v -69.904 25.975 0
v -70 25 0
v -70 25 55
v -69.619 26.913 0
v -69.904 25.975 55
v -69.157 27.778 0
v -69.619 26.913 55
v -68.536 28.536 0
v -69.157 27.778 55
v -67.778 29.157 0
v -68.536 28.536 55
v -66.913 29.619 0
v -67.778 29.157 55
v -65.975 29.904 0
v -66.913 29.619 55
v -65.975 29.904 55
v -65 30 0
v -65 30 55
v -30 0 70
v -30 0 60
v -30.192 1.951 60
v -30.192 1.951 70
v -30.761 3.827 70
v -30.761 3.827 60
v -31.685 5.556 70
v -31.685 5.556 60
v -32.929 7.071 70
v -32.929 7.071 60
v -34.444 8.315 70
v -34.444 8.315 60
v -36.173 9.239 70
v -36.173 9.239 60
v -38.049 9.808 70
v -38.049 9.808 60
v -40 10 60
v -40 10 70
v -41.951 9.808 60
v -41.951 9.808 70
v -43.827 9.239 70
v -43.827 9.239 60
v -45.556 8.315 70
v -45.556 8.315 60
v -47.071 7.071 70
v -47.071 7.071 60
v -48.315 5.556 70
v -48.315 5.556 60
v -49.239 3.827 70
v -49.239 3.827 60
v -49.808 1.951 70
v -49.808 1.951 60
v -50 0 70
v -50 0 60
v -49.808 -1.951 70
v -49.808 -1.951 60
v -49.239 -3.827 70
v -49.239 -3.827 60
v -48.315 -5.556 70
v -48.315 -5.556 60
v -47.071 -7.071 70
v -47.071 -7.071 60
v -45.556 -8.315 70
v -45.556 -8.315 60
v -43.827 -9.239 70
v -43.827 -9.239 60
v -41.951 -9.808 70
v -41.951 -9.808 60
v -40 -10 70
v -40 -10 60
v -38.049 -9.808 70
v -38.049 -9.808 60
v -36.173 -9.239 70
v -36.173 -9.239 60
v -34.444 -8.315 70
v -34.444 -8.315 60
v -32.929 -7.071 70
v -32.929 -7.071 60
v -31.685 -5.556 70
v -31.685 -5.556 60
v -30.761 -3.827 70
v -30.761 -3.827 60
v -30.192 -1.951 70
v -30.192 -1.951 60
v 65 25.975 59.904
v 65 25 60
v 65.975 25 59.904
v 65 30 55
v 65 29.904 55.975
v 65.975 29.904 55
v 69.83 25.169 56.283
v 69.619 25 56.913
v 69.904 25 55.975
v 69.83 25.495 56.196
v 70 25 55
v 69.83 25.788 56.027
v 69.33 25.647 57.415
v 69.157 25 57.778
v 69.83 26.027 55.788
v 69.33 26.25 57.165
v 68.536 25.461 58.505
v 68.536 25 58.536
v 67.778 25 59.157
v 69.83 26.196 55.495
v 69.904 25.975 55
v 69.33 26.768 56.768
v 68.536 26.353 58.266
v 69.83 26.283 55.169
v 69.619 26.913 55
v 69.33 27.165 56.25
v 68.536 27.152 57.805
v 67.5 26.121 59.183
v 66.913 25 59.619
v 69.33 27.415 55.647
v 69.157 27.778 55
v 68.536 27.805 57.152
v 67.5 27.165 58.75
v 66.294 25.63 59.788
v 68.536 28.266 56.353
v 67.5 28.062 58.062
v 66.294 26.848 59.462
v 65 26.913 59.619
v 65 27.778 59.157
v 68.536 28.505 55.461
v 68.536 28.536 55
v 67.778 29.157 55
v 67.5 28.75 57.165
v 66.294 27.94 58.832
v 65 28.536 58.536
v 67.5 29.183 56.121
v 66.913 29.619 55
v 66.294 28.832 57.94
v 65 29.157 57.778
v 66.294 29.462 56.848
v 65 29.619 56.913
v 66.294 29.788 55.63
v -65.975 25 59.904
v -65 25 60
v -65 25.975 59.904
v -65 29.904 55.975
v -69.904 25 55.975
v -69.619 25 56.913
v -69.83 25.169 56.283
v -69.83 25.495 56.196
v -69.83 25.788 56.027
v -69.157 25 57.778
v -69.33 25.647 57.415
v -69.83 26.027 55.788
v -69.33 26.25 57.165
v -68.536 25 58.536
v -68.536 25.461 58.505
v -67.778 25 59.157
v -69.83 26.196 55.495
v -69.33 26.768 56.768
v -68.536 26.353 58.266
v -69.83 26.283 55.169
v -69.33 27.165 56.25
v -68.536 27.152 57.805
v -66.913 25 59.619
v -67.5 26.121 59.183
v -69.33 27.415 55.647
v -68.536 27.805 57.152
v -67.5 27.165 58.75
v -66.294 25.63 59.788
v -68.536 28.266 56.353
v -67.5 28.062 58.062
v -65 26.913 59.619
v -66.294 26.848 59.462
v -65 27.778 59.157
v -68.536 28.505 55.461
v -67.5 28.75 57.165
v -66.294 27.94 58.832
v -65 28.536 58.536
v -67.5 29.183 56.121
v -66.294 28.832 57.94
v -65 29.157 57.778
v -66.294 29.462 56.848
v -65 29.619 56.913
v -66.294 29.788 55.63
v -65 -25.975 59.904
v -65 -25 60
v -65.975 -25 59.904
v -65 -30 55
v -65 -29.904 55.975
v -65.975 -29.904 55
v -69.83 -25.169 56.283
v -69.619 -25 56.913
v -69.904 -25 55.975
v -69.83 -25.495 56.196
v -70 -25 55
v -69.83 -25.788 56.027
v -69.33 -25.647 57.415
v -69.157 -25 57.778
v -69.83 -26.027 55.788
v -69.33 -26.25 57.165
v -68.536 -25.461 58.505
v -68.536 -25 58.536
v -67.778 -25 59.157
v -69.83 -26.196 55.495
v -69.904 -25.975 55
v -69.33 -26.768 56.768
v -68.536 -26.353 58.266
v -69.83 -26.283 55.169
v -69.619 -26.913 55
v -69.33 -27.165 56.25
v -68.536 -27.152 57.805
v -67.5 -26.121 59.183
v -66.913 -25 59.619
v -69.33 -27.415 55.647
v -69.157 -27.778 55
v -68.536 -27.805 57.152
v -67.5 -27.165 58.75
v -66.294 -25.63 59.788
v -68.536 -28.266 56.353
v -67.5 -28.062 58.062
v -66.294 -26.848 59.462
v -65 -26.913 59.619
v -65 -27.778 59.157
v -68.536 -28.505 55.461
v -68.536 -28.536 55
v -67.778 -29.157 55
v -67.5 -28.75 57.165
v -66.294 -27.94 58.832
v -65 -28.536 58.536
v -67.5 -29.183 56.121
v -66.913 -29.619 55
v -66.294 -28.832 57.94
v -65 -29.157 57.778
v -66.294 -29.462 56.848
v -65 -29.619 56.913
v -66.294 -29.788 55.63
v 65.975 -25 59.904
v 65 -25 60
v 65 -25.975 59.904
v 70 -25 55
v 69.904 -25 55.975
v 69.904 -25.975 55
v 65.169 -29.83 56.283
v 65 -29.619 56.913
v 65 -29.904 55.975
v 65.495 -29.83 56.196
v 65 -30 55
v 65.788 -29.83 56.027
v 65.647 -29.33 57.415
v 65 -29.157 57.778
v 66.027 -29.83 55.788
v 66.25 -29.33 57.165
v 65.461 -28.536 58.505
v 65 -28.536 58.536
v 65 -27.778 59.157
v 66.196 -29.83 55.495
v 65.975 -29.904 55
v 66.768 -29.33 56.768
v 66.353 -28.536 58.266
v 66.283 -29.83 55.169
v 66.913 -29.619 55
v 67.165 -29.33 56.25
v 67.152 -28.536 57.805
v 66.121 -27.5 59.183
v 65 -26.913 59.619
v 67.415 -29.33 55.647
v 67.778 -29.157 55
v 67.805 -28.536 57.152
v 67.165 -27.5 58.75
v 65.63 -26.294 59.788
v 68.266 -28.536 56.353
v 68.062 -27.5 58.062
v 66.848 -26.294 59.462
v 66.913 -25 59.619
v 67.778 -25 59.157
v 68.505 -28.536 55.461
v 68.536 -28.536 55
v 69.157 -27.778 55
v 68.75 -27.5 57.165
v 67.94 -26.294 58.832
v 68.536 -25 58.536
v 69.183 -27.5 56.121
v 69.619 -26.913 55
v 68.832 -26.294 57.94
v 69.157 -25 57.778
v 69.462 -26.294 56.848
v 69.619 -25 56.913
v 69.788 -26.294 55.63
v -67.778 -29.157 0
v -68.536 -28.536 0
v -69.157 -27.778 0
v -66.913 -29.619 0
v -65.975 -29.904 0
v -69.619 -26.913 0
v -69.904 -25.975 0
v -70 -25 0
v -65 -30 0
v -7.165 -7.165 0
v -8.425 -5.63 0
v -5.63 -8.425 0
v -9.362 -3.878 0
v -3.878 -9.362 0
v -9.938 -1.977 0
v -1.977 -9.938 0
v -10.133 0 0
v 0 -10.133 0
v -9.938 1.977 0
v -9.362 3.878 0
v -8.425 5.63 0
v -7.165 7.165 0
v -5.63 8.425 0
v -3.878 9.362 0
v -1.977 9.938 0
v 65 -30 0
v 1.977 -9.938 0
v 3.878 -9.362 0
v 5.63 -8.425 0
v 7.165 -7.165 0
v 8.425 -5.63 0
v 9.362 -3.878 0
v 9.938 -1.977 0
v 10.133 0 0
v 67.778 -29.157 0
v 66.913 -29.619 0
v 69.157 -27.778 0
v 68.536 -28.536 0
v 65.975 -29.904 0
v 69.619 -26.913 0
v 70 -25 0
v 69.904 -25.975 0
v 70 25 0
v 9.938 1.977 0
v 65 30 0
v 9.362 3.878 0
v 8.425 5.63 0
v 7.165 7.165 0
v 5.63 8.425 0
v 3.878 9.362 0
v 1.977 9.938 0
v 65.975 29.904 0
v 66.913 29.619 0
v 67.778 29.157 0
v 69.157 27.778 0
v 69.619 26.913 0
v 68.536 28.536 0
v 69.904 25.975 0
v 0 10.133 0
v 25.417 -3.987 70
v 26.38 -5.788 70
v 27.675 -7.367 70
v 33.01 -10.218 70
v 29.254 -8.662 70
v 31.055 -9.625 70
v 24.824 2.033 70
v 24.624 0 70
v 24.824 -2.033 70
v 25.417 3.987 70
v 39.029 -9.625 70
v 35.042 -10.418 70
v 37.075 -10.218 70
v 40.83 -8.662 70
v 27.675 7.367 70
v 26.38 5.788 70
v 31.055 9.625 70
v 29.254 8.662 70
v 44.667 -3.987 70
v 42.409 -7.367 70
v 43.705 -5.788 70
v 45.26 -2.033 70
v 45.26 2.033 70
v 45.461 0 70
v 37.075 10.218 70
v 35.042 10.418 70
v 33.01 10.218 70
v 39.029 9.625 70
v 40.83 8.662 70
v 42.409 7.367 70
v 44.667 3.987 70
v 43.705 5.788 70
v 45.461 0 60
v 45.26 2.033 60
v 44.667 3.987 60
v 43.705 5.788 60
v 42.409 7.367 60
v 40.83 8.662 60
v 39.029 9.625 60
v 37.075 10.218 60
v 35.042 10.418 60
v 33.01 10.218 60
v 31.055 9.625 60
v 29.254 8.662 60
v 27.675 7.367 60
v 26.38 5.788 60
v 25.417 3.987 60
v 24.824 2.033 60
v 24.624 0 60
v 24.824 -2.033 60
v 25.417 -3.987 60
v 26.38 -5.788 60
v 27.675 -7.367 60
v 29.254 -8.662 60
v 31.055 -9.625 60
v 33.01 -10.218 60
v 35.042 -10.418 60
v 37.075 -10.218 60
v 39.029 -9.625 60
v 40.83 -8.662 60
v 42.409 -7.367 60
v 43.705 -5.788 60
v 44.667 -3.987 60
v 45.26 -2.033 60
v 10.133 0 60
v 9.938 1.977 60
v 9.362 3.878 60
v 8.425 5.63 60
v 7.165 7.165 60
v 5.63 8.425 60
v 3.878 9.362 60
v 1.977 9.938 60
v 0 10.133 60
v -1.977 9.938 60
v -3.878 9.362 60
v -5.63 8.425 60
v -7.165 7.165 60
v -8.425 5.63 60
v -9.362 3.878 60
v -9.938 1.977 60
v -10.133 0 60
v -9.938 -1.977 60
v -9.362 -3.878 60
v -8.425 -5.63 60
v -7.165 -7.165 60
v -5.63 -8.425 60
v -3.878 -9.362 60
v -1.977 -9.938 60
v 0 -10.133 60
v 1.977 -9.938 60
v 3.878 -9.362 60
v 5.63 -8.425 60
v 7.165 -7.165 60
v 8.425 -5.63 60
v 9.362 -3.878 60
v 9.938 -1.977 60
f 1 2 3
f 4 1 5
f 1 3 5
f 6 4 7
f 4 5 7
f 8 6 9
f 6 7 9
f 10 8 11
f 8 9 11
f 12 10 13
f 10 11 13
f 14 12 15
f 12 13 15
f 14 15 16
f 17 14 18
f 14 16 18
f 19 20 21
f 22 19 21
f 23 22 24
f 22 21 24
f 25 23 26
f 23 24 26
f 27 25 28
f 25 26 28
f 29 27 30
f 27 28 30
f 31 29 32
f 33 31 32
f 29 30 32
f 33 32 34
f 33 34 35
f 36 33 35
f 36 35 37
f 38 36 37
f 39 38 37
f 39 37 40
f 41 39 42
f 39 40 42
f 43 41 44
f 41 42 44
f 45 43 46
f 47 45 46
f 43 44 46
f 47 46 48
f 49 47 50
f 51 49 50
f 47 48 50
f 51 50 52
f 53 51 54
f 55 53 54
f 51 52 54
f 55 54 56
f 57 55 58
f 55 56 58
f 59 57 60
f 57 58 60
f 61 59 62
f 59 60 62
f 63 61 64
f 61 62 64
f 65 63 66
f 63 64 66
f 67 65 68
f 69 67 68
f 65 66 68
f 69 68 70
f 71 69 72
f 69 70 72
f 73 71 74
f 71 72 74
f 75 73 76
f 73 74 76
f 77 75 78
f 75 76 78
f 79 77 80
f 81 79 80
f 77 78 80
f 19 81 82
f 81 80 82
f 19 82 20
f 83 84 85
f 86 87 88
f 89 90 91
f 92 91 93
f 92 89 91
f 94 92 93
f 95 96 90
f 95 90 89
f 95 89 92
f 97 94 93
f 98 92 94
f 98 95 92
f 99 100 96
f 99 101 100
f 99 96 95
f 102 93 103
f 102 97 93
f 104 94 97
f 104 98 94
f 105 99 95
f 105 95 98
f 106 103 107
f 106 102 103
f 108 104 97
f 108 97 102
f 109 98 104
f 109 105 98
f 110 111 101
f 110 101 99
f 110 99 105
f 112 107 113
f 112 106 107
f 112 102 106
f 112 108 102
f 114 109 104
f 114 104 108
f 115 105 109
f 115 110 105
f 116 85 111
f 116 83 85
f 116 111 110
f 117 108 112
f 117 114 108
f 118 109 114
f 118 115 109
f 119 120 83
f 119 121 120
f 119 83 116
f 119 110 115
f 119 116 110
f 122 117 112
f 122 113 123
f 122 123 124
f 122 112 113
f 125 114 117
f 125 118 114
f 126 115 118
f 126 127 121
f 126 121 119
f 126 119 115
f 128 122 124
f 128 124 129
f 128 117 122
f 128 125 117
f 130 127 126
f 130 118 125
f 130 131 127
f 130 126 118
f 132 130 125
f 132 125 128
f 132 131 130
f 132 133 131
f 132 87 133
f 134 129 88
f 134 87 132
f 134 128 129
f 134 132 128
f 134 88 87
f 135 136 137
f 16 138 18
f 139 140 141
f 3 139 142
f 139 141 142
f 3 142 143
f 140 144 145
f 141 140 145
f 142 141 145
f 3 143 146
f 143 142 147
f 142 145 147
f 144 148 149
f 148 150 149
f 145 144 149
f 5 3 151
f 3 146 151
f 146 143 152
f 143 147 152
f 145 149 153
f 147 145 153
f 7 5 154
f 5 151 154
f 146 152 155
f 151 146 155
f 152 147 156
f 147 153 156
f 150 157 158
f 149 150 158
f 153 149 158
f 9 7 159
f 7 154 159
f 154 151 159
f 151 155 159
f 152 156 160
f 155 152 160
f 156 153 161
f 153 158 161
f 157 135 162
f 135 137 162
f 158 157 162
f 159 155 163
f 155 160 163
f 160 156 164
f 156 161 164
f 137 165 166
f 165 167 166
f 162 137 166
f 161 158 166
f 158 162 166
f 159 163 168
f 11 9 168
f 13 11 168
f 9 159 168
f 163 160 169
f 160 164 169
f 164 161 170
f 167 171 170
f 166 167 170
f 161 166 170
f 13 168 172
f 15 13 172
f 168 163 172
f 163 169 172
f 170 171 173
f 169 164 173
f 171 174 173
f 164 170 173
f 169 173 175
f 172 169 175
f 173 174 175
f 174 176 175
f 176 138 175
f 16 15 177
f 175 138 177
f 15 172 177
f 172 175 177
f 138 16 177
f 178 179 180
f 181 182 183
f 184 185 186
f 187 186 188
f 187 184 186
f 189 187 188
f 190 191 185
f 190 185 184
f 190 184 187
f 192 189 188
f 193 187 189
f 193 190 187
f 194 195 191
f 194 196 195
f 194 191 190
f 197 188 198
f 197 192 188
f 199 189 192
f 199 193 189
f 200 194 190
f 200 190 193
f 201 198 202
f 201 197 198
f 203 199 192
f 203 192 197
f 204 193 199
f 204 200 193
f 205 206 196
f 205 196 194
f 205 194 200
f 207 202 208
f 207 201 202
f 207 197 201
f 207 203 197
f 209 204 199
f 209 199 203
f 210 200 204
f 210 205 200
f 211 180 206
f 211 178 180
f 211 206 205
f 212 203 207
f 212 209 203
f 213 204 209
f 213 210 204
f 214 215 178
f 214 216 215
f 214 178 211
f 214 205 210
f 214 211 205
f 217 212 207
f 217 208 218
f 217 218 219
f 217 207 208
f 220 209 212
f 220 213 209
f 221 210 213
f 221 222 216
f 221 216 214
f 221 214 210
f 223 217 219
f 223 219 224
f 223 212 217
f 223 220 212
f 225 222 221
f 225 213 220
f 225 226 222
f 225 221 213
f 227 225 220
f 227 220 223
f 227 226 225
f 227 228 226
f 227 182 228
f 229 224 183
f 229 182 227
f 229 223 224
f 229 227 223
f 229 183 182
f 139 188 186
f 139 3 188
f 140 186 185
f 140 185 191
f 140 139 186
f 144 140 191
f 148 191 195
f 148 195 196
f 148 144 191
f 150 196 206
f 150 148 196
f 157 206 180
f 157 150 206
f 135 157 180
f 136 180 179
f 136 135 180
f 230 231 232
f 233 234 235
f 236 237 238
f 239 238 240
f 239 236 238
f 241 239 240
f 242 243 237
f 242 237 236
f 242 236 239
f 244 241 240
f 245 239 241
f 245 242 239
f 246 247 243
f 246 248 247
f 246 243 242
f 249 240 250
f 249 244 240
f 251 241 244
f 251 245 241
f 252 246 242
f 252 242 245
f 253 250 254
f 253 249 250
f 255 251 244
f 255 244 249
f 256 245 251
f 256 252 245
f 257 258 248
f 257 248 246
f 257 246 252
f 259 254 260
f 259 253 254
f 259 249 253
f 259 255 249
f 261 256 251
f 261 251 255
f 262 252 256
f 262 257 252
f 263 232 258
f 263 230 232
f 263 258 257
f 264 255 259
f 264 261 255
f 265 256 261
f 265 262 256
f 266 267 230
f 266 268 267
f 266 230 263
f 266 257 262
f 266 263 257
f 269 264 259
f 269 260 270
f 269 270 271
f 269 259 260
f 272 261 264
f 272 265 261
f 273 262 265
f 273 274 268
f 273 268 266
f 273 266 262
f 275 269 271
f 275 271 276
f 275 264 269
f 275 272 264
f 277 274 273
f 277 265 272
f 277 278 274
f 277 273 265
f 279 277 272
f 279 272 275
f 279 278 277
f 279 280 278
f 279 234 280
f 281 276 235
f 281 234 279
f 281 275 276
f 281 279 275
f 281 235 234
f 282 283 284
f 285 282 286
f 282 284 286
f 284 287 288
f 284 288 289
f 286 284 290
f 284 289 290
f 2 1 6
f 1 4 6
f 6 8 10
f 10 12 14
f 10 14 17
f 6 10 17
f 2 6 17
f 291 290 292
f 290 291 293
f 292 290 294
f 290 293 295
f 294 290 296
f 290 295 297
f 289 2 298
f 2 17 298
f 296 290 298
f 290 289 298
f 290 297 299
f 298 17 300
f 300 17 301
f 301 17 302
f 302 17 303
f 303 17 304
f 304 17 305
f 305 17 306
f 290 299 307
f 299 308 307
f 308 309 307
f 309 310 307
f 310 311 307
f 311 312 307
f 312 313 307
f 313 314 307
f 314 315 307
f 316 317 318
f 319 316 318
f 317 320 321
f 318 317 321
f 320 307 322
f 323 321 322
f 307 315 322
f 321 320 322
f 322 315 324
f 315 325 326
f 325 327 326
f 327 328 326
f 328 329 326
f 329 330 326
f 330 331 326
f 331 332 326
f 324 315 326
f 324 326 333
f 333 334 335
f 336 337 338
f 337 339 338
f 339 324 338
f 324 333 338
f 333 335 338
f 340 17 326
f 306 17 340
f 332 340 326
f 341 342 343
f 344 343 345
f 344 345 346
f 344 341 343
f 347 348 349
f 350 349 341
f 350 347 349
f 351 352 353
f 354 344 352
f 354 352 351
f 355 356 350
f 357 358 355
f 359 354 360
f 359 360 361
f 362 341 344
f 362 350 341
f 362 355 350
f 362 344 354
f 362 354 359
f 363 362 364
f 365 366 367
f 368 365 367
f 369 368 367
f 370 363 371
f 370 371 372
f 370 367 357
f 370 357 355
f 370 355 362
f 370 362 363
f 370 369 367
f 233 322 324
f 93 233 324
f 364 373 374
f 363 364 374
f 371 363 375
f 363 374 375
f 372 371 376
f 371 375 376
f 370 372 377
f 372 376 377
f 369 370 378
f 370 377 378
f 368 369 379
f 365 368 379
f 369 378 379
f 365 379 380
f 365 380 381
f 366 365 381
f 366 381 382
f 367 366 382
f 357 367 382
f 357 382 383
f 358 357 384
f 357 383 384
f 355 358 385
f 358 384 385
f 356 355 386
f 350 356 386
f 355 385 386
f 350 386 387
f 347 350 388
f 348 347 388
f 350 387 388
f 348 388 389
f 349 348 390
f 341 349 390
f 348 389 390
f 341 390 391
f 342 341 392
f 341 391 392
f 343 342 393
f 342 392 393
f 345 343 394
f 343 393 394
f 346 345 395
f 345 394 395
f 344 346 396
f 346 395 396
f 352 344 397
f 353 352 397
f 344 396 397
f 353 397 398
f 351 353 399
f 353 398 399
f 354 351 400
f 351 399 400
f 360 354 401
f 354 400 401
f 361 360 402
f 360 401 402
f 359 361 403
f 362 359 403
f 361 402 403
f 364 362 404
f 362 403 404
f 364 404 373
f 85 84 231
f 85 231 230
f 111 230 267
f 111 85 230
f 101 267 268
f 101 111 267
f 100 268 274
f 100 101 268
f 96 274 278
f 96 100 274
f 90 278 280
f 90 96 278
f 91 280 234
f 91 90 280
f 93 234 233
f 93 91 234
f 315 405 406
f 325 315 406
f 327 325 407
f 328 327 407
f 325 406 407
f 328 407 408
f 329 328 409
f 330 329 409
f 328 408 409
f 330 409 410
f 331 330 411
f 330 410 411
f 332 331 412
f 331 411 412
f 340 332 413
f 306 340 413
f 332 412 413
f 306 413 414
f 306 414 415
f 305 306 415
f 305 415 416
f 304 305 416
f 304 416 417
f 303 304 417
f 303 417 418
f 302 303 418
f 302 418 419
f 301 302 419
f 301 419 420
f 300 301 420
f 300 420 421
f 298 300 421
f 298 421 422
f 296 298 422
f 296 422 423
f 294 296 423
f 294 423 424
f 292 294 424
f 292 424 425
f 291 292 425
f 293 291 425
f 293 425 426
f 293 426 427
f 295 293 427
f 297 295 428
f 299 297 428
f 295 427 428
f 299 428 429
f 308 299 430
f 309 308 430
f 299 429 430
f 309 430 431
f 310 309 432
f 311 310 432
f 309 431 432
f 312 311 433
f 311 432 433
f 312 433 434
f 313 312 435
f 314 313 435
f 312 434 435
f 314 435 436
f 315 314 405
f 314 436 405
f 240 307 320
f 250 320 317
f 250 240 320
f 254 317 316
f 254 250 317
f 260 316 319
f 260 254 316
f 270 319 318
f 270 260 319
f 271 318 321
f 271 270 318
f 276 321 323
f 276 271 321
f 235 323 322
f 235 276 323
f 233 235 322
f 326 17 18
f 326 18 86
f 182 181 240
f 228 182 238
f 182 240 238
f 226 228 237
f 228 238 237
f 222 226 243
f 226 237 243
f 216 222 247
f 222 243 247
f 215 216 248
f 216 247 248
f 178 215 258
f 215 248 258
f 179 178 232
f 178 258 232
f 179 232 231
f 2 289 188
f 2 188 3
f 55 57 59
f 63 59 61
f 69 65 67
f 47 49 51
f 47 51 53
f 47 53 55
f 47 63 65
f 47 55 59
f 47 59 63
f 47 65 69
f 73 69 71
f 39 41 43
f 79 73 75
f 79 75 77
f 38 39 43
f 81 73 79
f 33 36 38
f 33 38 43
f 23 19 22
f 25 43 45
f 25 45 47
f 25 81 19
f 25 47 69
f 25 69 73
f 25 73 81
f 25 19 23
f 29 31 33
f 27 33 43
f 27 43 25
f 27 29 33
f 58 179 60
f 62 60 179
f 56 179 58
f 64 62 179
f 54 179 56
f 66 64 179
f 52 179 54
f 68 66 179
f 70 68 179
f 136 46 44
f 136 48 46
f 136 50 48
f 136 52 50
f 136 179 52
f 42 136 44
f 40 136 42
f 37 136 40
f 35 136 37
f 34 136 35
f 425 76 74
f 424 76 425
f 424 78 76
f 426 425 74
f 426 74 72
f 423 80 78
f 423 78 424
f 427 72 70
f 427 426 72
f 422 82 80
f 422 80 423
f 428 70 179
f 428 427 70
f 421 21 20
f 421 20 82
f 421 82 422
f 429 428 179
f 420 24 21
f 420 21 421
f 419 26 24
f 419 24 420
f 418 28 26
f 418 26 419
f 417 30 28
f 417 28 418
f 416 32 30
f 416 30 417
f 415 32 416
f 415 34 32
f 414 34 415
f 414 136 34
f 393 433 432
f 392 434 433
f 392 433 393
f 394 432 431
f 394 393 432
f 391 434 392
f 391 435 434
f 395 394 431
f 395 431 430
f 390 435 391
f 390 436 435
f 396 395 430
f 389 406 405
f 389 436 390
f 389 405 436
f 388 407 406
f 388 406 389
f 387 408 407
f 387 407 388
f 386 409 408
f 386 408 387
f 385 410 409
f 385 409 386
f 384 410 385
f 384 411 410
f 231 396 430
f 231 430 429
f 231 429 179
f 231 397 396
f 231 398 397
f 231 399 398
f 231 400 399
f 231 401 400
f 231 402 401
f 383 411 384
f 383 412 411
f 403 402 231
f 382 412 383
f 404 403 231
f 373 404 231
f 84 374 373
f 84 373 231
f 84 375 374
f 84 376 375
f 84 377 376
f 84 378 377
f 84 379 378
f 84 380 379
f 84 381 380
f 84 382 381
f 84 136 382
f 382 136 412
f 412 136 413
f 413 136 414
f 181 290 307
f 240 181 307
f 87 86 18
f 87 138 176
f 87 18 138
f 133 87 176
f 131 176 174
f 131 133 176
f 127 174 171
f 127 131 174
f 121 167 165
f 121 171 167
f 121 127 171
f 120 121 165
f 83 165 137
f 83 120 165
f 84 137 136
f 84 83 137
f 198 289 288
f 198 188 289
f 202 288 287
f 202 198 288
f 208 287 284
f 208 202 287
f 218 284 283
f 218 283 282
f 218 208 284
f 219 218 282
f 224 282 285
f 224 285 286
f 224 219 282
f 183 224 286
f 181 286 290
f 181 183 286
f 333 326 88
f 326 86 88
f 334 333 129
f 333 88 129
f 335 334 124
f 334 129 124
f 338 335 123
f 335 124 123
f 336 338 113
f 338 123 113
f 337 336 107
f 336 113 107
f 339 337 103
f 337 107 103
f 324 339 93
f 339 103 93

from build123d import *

# Parameters (mm, degrees)
F0_W     = 140
F0_H     = 60
F1_DEPTH = 60
F2_R     = 10
F5_DEPTH = 10
F4_R     = 10.13292
F6_DEPTH = 175
F3_R     = 10.418287
F7_DEPTH = 10
F8_R     = 5


with BuildPart() as f1:
    # F0 (on Top) → F1 (new body)
    with BuildSketch(Plane.XY):
        Rectangle(F0_W, F0_H)
    extrude(amount=F1_DEPTH)

    # F2 (on face) → F5 (join)
    with BuildSketch(Plane.XY.offset(60)):
        with Locations((-40, 0)):
            Circle(F2_R)
    extrude(amount=F5_DEPTH)

    # F4 (on face) → F6 (cut)
    with BuildSketch(Plane.XY.offset(60)):
        Circle(F4_R)
    extrude(amount=-F6_DEPTH, mode=Mode.SUBTRACT)

    # F3 (on face) → F7 (join)
    with BuildSketch(Plane.XY.offset(60)):
        with Locations((35.042234, 0)):
            Circle(F3_R)
    extrude(amount=F7_DEPTH)

    # F8
    f8_edges = [f1.edges().sort_by_distance(p)[0] for p in [
        (0, 30, 60),
        (70, 0, 60),
        (0, -30, 60),
        (-70, 0, 60),
        (-70, 30, 30),
        (-70, -30, 30),
        (70, -30, 30),
        (70, 30, 30),
    ]]
    fillet(f8_edges, radius=F8_R)


solid = f1.part
